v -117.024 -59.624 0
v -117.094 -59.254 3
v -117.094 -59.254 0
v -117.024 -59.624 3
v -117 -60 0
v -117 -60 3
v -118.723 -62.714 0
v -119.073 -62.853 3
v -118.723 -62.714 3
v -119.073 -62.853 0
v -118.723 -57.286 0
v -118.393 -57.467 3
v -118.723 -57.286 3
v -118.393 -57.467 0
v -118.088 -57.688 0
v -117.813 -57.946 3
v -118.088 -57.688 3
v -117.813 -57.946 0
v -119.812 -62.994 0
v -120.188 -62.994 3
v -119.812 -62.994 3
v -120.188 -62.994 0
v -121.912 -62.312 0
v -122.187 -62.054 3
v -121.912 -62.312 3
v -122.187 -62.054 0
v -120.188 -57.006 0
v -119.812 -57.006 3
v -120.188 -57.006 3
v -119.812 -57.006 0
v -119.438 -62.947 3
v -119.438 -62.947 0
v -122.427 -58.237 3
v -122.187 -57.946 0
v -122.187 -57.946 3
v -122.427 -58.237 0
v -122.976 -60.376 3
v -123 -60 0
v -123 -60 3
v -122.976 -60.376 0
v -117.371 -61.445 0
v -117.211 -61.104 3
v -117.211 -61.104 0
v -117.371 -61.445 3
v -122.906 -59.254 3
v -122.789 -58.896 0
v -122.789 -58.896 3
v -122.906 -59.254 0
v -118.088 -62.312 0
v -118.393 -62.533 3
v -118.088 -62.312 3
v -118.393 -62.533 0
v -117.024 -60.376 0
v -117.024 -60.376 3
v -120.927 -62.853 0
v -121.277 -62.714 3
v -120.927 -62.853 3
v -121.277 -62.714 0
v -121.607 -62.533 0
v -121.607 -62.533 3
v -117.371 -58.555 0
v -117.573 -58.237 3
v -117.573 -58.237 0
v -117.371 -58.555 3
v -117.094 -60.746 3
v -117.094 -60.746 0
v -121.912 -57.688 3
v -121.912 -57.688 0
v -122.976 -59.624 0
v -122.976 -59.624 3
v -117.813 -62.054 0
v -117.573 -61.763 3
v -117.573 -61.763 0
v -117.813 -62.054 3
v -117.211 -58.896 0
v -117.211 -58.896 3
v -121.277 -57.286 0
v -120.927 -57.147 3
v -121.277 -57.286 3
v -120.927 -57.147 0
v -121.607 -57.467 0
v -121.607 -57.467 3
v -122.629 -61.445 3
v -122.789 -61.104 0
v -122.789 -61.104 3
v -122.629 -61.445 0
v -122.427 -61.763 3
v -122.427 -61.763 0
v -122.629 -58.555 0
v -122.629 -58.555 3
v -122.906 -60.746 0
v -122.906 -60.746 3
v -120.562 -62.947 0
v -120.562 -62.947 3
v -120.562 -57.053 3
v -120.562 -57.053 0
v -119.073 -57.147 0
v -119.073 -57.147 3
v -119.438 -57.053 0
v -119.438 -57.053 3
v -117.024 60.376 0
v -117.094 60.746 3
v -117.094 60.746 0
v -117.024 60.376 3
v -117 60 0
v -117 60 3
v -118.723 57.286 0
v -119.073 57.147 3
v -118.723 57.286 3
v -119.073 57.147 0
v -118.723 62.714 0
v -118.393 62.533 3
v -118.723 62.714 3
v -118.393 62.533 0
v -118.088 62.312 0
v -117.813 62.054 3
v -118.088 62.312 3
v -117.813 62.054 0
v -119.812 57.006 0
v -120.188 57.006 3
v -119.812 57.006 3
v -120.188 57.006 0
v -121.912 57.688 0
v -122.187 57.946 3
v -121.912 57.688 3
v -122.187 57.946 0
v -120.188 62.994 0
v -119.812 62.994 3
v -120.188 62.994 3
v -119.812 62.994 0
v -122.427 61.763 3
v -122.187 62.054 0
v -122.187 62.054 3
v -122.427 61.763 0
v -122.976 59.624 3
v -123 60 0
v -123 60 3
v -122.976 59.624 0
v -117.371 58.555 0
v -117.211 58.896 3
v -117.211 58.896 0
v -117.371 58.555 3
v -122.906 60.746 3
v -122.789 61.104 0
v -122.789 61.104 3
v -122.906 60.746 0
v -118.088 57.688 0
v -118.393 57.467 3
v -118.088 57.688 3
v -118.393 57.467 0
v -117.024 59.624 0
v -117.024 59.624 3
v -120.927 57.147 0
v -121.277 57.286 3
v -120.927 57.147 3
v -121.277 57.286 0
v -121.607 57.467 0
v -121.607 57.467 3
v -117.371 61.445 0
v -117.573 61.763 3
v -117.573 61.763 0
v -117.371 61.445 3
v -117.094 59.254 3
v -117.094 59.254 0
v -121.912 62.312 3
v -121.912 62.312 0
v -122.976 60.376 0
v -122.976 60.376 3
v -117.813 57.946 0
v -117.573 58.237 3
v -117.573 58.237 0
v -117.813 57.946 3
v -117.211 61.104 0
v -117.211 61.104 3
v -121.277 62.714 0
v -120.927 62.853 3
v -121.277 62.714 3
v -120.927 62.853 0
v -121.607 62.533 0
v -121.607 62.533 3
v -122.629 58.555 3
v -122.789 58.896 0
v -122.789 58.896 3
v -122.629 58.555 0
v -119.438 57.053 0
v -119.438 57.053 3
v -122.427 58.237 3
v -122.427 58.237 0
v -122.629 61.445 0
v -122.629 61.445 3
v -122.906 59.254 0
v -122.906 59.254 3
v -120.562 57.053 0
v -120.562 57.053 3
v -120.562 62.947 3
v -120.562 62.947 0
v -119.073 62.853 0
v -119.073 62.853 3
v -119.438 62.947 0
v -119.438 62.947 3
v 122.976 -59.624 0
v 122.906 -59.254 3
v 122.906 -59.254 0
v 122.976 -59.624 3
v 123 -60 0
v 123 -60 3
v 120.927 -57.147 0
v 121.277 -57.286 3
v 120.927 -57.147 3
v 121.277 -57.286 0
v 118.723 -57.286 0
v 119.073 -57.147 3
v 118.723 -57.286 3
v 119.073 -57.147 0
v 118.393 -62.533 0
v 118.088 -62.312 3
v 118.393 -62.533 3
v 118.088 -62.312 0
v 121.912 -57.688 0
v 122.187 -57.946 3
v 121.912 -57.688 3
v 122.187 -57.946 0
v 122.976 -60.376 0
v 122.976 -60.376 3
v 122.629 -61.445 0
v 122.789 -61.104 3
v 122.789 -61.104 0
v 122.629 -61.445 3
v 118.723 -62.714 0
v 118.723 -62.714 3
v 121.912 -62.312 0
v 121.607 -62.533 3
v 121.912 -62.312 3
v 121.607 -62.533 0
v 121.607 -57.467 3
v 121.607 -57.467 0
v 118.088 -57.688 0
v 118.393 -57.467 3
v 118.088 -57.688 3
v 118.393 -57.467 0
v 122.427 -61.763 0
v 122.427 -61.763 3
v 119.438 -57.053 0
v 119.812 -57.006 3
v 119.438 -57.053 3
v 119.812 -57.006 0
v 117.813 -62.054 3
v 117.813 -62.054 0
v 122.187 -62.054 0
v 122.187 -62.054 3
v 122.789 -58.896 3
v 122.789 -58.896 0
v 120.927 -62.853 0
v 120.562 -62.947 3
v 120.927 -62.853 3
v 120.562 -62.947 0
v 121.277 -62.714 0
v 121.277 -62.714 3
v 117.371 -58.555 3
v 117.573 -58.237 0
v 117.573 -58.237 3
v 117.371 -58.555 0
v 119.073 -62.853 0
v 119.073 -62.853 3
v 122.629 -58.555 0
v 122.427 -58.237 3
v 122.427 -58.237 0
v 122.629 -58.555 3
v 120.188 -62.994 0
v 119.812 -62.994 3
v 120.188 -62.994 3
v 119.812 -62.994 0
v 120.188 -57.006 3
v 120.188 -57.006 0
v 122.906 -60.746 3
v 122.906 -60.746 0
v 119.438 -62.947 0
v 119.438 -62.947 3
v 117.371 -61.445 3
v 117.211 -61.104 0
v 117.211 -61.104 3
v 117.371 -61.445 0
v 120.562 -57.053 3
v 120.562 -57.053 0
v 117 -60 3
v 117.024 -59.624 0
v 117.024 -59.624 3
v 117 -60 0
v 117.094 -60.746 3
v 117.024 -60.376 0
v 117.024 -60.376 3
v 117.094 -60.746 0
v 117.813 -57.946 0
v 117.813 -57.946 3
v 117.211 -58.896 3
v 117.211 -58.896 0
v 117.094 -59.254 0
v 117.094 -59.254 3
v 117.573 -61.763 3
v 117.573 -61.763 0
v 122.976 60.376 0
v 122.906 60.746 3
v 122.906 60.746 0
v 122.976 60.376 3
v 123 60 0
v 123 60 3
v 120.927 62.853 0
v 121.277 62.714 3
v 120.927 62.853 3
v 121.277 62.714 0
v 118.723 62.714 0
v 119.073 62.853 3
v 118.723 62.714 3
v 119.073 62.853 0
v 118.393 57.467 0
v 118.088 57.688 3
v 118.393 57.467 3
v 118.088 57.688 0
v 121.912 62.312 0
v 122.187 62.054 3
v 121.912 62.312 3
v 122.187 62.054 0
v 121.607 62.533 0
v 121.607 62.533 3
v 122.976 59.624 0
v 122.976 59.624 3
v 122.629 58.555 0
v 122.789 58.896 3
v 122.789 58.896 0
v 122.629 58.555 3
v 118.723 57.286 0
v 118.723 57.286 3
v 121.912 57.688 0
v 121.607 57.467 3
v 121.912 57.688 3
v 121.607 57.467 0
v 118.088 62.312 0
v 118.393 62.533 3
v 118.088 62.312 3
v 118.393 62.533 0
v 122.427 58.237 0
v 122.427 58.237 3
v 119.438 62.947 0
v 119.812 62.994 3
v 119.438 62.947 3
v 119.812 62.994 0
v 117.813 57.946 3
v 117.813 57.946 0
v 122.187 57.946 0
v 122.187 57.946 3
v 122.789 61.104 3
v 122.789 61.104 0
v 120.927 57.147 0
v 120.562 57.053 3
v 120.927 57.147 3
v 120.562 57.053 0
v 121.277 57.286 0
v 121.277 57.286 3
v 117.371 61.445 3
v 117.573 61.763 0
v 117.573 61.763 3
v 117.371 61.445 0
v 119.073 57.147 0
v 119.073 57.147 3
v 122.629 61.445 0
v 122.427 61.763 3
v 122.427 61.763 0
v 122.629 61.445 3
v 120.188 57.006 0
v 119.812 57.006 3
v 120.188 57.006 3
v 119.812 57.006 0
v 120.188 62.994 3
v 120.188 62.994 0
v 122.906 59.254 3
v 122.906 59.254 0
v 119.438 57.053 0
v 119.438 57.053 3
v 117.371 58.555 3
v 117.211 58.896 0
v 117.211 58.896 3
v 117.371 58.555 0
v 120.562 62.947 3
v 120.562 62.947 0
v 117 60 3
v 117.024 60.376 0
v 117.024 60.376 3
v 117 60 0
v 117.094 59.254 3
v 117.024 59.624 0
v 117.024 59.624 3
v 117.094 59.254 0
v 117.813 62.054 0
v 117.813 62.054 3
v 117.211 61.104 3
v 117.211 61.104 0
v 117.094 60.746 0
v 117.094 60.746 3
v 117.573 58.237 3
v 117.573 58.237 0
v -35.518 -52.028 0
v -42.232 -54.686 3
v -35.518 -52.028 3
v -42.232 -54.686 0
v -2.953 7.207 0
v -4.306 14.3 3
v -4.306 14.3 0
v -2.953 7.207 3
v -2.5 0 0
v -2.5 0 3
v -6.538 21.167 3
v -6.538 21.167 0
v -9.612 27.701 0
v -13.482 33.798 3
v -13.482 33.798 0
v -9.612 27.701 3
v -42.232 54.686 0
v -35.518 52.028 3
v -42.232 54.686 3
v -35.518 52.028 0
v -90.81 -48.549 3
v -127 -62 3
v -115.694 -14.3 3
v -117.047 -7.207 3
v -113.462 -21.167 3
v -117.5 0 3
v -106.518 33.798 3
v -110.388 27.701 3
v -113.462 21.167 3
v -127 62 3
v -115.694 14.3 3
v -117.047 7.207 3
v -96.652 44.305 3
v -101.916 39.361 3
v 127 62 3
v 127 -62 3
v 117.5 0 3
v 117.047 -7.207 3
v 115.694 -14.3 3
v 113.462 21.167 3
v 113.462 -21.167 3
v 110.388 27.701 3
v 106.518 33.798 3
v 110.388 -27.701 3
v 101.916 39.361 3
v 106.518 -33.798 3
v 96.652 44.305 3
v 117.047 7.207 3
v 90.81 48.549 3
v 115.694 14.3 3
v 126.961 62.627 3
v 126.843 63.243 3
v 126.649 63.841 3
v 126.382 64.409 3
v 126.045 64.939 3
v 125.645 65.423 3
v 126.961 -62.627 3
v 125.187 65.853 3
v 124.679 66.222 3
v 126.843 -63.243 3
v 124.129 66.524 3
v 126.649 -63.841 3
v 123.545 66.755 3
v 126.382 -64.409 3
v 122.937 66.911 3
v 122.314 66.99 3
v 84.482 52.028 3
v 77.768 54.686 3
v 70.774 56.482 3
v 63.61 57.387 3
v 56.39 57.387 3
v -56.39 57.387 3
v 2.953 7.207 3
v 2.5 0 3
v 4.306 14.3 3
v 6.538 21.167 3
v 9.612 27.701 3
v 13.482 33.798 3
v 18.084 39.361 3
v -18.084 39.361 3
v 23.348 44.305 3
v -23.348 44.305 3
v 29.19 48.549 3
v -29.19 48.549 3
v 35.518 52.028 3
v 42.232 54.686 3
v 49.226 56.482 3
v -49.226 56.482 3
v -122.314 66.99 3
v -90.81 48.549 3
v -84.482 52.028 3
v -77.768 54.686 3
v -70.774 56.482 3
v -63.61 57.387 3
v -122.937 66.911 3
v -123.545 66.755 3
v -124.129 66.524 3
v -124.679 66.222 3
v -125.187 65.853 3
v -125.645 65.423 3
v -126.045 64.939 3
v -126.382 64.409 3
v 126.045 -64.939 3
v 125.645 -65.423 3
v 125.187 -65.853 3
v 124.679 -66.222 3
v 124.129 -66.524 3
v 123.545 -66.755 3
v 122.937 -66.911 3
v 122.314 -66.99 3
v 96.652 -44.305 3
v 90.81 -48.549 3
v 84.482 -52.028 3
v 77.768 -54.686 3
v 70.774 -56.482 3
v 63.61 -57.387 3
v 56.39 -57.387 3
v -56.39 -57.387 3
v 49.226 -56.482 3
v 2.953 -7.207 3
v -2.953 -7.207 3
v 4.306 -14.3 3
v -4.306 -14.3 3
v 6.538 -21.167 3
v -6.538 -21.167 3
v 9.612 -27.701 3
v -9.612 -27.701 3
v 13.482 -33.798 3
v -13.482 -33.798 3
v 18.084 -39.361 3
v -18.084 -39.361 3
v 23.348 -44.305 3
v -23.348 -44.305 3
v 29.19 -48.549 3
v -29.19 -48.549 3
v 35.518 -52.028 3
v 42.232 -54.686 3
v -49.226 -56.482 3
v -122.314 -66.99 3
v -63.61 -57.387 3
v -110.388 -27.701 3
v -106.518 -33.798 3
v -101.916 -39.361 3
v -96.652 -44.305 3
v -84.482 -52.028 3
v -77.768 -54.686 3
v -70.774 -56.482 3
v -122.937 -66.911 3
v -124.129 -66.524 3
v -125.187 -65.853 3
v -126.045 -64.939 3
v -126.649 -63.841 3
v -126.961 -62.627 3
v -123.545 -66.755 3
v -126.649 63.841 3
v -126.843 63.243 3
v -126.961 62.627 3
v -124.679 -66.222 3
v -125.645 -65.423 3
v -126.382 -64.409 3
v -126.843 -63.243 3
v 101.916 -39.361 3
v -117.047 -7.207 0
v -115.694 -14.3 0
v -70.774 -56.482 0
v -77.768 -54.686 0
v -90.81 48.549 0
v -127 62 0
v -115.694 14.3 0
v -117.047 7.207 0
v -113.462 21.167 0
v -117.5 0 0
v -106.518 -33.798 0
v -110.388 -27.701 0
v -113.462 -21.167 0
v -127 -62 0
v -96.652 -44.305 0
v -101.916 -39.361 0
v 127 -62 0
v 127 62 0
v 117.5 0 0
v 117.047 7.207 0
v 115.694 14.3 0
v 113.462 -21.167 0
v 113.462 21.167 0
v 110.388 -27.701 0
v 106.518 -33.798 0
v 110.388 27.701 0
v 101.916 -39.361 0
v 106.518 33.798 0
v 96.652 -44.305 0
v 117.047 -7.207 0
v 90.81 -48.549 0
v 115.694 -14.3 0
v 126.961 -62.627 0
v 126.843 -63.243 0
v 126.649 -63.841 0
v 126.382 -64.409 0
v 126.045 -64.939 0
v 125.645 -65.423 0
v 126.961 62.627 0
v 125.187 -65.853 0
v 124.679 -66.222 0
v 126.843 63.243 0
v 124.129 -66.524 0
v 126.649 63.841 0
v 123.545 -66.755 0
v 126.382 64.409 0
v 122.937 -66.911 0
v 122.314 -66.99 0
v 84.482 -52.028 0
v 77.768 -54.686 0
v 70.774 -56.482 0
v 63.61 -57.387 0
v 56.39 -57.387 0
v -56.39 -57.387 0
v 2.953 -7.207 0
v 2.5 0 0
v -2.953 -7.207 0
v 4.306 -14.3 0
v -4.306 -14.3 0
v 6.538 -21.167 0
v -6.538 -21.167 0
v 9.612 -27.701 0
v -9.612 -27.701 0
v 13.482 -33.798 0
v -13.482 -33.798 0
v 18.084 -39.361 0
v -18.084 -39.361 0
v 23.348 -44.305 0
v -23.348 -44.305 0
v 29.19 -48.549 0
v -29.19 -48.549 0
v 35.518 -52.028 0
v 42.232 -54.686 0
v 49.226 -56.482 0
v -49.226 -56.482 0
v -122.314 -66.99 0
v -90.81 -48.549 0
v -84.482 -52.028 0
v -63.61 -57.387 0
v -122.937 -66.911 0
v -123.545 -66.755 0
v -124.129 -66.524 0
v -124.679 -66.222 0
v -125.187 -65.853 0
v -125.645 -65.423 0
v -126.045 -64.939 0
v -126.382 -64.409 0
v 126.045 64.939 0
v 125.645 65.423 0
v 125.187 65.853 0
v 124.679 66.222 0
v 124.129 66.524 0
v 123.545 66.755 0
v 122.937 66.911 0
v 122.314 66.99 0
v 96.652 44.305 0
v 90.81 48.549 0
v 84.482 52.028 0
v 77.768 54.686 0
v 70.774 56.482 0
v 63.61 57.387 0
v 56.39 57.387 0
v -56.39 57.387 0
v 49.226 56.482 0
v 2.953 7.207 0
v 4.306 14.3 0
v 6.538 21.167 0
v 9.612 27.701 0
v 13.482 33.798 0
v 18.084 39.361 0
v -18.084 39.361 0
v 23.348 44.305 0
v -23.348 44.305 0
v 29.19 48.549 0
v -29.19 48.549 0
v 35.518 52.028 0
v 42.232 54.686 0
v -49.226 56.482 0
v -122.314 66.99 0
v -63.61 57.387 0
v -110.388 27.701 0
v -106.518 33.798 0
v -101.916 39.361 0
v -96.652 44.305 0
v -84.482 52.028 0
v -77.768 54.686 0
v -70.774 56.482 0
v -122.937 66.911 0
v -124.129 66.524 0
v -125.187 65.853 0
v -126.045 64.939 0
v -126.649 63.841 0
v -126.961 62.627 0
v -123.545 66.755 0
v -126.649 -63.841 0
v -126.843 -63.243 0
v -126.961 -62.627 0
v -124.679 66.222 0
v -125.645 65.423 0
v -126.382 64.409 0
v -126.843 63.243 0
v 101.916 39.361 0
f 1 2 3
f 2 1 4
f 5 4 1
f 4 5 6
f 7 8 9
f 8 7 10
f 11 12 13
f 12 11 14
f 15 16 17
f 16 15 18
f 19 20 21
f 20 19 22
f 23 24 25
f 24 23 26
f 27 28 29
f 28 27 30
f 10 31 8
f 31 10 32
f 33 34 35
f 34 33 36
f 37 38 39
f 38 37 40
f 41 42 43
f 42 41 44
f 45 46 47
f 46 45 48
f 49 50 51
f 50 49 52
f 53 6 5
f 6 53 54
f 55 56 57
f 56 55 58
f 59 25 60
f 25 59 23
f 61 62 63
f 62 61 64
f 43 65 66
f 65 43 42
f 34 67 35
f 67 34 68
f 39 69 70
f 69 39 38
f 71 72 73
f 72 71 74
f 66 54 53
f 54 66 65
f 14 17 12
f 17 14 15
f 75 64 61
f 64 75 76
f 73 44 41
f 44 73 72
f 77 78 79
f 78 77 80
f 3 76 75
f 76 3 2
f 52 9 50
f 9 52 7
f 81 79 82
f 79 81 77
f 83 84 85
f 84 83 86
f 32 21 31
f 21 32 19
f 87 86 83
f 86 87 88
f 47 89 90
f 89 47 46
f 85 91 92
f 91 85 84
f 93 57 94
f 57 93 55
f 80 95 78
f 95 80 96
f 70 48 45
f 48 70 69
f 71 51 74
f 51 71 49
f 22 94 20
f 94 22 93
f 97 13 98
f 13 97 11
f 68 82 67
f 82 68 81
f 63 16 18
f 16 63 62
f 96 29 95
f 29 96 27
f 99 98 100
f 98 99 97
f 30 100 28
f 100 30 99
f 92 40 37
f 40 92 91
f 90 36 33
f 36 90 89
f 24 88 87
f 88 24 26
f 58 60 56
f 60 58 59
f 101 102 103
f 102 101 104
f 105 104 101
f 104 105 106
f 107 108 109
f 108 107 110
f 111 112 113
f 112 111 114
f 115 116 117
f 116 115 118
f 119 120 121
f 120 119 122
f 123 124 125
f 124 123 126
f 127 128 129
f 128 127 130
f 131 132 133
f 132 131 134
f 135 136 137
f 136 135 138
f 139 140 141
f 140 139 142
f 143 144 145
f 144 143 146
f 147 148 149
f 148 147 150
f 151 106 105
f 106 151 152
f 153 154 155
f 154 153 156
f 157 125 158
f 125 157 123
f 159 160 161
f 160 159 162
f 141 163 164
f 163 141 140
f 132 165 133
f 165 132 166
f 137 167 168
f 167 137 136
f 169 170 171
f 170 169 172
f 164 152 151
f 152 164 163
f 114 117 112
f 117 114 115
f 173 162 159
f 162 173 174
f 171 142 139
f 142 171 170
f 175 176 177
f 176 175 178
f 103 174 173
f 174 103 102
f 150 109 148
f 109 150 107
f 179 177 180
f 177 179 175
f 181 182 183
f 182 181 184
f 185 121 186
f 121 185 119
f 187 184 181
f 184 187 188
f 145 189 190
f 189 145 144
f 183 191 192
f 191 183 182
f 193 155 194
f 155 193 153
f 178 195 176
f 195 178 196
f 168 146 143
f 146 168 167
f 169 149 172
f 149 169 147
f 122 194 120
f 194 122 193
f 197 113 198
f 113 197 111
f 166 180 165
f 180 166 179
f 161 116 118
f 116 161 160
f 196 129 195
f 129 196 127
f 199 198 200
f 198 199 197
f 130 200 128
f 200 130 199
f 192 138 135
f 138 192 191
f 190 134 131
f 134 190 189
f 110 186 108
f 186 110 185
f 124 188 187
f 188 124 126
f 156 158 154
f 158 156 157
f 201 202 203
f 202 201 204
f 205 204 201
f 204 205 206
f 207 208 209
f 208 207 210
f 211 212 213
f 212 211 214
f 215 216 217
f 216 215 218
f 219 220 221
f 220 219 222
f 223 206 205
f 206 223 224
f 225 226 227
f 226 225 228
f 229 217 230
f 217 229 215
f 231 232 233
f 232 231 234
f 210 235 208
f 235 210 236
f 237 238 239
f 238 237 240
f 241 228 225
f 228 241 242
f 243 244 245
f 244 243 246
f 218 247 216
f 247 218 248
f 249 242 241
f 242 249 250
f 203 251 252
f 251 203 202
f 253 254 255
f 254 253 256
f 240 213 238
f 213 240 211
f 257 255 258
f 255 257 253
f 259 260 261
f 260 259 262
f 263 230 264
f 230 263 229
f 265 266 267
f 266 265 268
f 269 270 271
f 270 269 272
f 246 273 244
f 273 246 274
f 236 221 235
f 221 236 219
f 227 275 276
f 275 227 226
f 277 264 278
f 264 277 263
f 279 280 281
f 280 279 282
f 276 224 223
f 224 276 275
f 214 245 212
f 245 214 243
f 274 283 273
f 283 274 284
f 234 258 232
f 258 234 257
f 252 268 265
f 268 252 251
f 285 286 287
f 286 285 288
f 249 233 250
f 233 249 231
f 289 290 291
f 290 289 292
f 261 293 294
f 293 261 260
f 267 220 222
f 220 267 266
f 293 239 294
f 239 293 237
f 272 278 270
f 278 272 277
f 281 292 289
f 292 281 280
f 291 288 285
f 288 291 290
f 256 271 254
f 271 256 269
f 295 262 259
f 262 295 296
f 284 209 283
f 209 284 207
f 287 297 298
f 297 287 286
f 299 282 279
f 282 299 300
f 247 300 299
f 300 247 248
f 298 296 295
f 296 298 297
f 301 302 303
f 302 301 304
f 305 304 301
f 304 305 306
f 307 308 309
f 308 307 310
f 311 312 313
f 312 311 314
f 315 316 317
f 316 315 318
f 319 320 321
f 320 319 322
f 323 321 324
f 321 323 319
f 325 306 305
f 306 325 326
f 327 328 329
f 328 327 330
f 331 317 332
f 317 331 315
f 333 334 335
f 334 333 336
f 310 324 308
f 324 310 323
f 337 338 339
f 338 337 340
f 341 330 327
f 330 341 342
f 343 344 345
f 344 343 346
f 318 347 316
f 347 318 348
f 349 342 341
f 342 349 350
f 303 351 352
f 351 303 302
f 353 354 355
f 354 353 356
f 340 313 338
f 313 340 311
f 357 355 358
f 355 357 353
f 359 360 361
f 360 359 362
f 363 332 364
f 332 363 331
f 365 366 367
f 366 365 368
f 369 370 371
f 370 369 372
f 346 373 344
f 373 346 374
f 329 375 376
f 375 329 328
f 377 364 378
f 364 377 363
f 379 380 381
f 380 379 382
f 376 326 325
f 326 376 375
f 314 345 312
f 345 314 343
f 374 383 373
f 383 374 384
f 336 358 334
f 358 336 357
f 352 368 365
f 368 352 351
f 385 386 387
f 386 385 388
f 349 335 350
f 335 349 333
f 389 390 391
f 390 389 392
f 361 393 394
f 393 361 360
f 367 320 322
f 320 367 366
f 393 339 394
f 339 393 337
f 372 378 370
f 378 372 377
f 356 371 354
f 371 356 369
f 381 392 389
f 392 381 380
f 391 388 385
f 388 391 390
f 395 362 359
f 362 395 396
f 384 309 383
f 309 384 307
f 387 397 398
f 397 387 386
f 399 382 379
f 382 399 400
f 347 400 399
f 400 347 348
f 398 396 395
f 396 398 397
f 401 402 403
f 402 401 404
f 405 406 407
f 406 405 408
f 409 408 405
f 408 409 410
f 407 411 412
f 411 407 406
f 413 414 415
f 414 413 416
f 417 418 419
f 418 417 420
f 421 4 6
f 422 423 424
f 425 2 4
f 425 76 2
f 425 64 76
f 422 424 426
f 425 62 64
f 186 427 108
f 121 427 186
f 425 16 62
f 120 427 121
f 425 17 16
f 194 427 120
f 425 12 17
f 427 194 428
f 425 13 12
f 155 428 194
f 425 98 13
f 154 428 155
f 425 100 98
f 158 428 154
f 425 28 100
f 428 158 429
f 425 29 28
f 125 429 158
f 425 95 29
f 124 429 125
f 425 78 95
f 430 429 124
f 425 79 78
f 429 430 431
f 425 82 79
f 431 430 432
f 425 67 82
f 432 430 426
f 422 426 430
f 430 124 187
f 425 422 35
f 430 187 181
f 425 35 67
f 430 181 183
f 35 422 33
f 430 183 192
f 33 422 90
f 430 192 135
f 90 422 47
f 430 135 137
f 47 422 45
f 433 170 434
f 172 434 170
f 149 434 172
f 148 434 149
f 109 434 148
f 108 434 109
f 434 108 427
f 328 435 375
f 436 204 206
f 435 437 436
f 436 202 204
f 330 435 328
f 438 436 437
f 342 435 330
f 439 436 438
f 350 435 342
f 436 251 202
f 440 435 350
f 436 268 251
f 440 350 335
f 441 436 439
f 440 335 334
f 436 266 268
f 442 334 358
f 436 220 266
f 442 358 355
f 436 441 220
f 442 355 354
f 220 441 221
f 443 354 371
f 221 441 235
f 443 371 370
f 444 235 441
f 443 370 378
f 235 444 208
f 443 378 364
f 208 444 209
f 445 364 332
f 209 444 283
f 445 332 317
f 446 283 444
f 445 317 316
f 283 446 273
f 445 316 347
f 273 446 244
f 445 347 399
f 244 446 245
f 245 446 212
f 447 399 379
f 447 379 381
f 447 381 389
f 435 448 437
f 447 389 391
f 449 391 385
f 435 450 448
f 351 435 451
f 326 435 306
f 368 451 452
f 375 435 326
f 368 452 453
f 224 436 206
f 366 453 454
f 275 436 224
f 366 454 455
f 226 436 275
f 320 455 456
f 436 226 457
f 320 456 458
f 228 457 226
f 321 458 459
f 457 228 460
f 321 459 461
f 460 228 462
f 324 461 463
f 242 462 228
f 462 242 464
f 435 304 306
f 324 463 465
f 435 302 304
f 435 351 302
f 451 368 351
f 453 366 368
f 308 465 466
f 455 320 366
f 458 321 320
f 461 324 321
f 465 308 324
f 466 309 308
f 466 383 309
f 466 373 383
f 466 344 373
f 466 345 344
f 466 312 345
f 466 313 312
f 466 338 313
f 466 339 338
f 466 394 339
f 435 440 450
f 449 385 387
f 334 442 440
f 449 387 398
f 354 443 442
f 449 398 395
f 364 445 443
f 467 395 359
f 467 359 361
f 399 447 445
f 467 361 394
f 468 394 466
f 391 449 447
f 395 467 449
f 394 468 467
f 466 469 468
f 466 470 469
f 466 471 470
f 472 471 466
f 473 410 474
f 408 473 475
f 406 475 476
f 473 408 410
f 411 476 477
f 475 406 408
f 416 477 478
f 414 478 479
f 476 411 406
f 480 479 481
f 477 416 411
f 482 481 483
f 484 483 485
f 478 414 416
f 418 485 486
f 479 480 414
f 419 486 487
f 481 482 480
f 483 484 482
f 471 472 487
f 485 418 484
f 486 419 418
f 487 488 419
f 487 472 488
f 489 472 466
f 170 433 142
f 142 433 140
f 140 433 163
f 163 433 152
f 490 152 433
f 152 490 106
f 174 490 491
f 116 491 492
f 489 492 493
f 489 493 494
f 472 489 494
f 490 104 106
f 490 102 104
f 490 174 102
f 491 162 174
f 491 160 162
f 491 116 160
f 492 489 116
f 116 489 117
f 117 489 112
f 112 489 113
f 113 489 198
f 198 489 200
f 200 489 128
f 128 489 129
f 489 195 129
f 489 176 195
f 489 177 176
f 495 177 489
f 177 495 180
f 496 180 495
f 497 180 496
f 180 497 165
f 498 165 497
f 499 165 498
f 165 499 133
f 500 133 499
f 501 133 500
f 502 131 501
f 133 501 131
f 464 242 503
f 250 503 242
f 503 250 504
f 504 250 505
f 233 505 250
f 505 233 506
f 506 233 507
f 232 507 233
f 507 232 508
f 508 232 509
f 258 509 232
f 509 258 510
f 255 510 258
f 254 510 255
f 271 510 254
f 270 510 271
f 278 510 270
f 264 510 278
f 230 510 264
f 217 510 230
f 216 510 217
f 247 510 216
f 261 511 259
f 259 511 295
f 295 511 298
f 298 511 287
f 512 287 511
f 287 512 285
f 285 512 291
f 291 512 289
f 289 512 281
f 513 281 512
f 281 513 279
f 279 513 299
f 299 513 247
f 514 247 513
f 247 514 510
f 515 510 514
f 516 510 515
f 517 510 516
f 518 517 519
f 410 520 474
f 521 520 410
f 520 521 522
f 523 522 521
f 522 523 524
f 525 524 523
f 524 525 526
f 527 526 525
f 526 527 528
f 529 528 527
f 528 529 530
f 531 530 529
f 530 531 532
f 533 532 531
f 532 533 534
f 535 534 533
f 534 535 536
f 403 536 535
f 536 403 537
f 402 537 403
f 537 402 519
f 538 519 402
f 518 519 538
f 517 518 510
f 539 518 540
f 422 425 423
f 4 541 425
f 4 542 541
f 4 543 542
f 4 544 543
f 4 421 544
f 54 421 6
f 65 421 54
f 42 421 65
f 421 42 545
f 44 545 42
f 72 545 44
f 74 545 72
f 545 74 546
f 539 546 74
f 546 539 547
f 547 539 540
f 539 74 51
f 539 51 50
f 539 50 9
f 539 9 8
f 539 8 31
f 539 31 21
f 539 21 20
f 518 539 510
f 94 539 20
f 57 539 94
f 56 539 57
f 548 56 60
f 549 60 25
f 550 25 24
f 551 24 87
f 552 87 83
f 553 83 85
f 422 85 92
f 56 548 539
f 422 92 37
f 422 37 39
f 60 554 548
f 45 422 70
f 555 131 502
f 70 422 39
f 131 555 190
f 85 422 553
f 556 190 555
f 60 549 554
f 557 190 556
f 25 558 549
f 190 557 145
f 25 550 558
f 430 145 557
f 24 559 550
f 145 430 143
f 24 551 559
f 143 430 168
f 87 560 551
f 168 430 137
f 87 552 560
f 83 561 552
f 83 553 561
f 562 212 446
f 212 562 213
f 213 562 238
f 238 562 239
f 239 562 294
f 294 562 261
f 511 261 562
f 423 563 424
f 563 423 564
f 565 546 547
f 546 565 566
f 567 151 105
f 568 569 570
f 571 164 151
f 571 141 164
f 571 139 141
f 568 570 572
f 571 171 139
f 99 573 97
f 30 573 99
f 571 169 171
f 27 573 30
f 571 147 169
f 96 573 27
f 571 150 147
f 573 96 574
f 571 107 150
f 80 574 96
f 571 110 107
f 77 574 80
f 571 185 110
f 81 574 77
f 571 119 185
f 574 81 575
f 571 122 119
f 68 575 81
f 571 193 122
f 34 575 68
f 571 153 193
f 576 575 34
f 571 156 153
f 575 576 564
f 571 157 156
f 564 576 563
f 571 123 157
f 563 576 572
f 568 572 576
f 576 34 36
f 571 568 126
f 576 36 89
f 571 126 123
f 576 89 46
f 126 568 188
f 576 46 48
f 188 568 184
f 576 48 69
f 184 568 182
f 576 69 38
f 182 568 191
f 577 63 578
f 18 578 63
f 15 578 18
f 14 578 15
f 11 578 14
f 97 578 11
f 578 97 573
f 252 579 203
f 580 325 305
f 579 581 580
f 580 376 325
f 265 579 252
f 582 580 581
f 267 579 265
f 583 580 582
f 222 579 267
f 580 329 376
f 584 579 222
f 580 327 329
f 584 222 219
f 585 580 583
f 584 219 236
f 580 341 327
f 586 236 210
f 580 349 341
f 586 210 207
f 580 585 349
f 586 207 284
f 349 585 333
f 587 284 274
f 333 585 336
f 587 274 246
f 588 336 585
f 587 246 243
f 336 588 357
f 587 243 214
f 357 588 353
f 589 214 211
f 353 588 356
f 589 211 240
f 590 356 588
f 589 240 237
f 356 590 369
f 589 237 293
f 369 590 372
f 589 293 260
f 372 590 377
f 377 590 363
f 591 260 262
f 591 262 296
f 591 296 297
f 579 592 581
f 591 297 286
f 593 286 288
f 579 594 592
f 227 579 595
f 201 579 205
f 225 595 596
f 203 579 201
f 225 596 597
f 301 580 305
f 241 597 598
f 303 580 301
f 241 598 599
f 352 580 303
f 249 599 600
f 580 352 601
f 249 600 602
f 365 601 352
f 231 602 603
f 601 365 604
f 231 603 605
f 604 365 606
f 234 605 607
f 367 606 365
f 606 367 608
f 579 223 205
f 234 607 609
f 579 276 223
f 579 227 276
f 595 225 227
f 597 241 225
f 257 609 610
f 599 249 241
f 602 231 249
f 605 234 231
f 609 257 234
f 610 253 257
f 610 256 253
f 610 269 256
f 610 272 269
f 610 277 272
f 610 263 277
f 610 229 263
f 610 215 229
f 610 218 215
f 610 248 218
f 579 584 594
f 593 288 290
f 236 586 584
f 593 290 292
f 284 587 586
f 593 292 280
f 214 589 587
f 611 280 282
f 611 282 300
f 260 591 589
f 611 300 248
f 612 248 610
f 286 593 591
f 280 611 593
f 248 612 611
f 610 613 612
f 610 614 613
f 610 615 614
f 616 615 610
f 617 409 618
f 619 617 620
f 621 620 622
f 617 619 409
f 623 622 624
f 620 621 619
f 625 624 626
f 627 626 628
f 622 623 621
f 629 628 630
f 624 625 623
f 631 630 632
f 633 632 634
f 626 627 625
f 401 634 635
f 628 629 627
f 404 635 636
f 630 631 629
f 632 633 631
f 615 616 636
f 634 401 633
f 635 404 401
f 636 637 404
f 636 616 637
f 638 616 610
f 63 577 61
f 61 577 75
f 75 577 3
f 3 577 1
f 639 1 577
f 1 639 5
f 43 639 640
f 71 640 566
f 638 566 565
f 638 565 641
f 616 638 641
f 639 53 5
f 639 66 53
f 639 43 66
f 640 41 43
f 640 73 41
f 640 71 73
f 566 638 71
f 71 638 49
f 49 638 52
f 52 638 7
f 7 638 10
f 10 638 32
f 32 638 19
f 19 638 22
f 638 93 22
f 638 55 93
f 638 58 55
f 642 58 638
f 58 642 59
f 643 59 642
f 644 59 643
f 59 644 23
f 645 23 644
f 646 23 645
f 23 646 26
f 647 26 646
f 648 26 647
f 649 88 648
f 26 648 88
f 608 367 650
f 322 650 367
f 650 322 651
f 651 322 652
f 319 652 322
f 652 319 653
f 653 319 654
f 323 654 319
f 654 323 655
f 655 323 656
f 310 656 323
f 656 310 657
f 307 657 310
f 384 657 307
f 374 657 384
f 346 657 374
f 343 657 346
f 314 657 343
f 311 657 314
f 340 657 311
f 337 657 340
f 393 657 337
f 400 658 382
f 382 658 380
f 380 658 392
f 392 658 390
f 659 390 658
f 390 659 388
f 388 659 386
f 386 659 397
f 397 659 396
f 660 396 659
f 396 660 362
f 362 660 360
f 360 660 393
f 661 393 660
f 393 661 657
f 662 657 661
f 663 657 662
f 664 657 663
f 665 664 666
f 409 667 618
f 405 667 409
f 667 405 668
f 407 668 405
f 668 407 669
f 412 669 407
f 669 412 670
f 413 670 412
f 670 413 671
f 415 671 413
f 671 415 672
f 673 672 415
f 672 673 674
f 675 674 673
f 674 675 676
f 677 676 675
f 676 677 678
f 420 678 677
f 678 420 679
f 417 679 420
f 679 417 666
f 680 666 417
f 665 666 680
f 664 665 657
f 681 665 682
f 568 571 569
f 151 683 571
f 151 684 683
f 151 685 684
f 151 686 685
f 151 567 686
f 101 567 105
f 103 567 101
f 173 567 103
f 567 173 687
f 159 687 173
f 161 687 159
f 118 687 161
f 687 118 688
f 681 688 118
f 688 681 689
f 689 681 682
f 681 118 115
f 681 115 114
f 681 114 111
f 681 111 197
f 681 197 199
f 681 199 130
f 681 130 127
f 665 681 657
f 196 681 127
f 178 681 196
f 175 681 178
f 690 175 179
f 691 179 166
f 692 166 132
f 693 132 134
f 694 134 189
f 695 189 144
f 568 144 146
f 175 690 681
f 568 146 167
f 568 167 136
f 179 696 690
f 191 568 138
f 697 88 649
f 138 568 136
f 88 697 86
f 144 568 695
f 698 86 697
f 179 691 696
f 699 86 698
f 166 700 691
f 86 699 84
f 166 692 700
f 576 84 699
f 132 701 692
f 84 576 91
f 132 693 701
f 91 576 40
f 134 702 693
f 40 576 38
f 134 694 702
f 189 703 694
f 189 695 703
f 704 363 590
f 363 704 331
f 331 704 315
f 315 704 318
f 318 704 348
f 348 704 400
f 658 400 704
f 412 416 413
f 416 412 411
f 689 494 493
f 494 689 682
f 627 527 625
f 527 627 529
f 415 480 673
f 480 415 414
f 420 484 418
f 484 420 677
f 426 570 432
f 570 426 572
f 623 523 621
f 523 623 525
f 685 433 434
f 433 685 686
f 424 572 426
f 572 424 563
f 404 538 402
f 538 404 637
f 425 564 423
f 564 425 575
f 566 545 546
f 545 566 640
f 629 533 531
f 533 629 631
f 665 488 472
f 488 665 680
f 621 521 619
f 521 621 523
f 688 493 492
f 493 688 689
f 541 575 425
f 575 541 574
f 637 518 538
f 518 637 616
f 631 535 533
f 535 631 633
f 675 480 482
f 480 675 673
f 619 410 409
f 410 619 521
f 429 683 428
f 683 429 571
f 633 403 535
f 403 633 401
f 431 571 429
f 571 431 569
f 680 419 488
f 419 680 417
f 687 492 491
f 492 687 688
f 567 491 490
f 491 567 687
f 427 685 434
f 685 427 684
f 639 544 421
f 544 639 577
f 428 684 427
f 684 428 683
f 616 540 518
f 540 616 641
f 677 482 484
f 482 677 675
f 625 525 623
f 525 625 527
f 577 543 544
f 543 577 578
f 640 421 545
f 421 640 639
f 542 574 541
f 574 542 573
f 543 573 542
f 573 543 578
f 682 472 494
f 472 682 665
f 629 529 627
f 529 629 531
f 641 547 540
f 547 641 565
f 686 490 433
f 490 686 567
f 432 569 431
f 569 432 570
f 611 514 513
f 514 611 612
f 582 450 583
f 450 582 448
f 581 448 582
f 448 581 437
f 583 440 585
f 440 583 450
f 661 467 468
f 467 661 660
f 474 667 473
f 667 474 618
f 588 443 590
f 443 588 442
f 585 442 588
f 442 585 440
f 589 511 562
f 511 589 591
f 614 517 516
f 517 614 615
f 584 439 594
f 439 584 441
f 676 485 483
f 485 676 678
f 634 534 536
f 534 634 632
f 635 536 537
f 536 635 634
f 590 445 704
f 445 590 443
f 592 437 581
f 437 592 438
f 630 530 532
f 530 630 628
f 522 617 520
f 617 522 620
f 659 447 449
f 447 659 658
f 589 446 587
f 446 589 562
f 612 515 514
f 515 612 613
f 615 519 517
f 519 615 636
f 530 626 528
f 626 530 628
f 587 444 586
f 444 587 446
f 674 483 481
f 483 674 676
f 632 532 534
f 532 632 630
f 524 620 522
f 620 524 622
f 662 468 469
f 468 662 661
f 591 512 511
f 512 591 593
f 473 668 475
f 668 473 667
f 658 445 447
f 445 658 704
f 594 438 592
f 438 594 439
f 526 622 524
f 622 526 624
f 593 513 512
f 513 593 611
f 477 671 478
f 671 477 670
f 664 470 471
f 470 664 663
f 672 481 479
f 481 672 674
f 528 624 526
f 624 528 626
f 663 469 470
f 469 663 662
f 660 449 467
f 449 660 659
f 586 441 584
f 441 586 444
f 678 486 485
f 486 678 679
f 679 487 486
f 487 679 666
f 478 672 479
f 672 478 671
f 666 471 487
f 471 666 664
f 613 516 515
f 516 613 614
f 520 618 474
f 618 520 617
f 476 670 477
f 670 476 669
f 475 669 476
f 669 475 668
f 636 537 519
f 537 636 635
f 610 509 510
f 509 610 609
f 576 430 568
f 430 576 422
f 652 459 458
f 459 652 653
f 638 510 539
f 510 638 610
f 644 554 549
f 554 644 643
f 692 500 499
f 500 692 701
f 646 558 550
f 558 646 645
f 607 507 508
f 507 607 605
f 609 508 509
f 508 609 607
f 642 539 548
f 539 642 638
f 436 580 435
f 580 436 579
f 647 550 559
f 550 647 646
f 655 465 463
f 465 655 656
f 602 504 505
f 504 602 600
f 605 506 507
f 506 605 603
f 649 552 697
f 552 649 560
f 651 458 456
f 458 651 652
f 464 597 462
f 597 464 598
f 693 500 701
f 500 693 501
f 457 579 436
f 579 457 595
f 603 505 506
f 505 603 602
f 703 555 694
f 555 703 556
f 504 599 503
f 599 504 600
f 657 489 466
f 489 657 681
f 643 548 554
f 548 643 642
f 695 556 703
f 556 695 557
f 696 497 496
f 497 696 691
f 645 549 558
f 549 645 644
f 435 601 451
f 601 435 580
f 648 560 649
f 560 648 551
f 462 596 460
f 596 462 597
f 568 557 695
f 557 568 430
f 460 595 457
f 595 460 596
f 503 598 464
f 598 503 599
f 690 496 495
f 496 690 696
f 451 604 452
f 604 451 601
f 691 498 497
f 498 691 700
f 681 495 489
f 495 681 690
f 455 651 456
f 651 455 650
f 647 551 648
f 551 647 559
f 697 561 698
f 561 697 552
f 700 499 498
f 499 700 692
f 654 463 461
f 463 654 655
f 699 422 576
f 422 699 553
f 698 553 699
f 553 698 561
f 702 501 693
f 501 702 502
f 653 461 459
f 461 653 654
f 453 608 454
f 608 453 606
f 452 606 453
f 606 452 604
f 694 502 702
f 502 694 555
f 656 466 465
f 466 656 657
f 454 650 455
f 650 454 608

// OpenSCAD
$fn = 50;


difference() {
	union() {
		hull() {
			translate(v = [-122.0000000000, 62.0000000000, 0]) {
				cylinder(h = 3, r = 5);
			}
			translate(v = [122.0000000000, 62.0000000000, 0]) {
				cylinder(h = 3, r = 5);
			}
			translate(v = [-122.0000000000, -62.0000000000, 0]) {
				cylinder(h = 3, r = 5);
			}
			translate(v = [122.0000000000, -62.0000000000, 0]) {
				cylinder(h = 3, r = 5);
			}
		}
	}
	union() {
		#translate(v = [-120.0000000000, -60.0000000000, -100.0000000000]) {
			cylinder(h = 200, r = 3.0000000000);
		}
		#translate(v = [-120.0000000000, 60.0000000000, -100.0000000000]) {
			cylinder(h = 200, r = 3.0000000000);
		}
		#translate(v = [120.0000000000, -60.0000000000, -100.0000000000]) {
			cylinder(h = 200, r = 3.0000000000);
		}
		#translate(v = [120.0000000000, 60.0000000000, -100.0000000000]) {
			cylinder(h = 200, r = 3.0000000000);
		}
		#translate(v = [-60.0000000000, 0, 0]) {
			cylinder(h = 3, r = 57.5000000000);
		}
		#translate(v = [60.0000000000, 0, 0]) {
			cylinder(h = 3, r = 57.5000000000);
		}
	}
}
